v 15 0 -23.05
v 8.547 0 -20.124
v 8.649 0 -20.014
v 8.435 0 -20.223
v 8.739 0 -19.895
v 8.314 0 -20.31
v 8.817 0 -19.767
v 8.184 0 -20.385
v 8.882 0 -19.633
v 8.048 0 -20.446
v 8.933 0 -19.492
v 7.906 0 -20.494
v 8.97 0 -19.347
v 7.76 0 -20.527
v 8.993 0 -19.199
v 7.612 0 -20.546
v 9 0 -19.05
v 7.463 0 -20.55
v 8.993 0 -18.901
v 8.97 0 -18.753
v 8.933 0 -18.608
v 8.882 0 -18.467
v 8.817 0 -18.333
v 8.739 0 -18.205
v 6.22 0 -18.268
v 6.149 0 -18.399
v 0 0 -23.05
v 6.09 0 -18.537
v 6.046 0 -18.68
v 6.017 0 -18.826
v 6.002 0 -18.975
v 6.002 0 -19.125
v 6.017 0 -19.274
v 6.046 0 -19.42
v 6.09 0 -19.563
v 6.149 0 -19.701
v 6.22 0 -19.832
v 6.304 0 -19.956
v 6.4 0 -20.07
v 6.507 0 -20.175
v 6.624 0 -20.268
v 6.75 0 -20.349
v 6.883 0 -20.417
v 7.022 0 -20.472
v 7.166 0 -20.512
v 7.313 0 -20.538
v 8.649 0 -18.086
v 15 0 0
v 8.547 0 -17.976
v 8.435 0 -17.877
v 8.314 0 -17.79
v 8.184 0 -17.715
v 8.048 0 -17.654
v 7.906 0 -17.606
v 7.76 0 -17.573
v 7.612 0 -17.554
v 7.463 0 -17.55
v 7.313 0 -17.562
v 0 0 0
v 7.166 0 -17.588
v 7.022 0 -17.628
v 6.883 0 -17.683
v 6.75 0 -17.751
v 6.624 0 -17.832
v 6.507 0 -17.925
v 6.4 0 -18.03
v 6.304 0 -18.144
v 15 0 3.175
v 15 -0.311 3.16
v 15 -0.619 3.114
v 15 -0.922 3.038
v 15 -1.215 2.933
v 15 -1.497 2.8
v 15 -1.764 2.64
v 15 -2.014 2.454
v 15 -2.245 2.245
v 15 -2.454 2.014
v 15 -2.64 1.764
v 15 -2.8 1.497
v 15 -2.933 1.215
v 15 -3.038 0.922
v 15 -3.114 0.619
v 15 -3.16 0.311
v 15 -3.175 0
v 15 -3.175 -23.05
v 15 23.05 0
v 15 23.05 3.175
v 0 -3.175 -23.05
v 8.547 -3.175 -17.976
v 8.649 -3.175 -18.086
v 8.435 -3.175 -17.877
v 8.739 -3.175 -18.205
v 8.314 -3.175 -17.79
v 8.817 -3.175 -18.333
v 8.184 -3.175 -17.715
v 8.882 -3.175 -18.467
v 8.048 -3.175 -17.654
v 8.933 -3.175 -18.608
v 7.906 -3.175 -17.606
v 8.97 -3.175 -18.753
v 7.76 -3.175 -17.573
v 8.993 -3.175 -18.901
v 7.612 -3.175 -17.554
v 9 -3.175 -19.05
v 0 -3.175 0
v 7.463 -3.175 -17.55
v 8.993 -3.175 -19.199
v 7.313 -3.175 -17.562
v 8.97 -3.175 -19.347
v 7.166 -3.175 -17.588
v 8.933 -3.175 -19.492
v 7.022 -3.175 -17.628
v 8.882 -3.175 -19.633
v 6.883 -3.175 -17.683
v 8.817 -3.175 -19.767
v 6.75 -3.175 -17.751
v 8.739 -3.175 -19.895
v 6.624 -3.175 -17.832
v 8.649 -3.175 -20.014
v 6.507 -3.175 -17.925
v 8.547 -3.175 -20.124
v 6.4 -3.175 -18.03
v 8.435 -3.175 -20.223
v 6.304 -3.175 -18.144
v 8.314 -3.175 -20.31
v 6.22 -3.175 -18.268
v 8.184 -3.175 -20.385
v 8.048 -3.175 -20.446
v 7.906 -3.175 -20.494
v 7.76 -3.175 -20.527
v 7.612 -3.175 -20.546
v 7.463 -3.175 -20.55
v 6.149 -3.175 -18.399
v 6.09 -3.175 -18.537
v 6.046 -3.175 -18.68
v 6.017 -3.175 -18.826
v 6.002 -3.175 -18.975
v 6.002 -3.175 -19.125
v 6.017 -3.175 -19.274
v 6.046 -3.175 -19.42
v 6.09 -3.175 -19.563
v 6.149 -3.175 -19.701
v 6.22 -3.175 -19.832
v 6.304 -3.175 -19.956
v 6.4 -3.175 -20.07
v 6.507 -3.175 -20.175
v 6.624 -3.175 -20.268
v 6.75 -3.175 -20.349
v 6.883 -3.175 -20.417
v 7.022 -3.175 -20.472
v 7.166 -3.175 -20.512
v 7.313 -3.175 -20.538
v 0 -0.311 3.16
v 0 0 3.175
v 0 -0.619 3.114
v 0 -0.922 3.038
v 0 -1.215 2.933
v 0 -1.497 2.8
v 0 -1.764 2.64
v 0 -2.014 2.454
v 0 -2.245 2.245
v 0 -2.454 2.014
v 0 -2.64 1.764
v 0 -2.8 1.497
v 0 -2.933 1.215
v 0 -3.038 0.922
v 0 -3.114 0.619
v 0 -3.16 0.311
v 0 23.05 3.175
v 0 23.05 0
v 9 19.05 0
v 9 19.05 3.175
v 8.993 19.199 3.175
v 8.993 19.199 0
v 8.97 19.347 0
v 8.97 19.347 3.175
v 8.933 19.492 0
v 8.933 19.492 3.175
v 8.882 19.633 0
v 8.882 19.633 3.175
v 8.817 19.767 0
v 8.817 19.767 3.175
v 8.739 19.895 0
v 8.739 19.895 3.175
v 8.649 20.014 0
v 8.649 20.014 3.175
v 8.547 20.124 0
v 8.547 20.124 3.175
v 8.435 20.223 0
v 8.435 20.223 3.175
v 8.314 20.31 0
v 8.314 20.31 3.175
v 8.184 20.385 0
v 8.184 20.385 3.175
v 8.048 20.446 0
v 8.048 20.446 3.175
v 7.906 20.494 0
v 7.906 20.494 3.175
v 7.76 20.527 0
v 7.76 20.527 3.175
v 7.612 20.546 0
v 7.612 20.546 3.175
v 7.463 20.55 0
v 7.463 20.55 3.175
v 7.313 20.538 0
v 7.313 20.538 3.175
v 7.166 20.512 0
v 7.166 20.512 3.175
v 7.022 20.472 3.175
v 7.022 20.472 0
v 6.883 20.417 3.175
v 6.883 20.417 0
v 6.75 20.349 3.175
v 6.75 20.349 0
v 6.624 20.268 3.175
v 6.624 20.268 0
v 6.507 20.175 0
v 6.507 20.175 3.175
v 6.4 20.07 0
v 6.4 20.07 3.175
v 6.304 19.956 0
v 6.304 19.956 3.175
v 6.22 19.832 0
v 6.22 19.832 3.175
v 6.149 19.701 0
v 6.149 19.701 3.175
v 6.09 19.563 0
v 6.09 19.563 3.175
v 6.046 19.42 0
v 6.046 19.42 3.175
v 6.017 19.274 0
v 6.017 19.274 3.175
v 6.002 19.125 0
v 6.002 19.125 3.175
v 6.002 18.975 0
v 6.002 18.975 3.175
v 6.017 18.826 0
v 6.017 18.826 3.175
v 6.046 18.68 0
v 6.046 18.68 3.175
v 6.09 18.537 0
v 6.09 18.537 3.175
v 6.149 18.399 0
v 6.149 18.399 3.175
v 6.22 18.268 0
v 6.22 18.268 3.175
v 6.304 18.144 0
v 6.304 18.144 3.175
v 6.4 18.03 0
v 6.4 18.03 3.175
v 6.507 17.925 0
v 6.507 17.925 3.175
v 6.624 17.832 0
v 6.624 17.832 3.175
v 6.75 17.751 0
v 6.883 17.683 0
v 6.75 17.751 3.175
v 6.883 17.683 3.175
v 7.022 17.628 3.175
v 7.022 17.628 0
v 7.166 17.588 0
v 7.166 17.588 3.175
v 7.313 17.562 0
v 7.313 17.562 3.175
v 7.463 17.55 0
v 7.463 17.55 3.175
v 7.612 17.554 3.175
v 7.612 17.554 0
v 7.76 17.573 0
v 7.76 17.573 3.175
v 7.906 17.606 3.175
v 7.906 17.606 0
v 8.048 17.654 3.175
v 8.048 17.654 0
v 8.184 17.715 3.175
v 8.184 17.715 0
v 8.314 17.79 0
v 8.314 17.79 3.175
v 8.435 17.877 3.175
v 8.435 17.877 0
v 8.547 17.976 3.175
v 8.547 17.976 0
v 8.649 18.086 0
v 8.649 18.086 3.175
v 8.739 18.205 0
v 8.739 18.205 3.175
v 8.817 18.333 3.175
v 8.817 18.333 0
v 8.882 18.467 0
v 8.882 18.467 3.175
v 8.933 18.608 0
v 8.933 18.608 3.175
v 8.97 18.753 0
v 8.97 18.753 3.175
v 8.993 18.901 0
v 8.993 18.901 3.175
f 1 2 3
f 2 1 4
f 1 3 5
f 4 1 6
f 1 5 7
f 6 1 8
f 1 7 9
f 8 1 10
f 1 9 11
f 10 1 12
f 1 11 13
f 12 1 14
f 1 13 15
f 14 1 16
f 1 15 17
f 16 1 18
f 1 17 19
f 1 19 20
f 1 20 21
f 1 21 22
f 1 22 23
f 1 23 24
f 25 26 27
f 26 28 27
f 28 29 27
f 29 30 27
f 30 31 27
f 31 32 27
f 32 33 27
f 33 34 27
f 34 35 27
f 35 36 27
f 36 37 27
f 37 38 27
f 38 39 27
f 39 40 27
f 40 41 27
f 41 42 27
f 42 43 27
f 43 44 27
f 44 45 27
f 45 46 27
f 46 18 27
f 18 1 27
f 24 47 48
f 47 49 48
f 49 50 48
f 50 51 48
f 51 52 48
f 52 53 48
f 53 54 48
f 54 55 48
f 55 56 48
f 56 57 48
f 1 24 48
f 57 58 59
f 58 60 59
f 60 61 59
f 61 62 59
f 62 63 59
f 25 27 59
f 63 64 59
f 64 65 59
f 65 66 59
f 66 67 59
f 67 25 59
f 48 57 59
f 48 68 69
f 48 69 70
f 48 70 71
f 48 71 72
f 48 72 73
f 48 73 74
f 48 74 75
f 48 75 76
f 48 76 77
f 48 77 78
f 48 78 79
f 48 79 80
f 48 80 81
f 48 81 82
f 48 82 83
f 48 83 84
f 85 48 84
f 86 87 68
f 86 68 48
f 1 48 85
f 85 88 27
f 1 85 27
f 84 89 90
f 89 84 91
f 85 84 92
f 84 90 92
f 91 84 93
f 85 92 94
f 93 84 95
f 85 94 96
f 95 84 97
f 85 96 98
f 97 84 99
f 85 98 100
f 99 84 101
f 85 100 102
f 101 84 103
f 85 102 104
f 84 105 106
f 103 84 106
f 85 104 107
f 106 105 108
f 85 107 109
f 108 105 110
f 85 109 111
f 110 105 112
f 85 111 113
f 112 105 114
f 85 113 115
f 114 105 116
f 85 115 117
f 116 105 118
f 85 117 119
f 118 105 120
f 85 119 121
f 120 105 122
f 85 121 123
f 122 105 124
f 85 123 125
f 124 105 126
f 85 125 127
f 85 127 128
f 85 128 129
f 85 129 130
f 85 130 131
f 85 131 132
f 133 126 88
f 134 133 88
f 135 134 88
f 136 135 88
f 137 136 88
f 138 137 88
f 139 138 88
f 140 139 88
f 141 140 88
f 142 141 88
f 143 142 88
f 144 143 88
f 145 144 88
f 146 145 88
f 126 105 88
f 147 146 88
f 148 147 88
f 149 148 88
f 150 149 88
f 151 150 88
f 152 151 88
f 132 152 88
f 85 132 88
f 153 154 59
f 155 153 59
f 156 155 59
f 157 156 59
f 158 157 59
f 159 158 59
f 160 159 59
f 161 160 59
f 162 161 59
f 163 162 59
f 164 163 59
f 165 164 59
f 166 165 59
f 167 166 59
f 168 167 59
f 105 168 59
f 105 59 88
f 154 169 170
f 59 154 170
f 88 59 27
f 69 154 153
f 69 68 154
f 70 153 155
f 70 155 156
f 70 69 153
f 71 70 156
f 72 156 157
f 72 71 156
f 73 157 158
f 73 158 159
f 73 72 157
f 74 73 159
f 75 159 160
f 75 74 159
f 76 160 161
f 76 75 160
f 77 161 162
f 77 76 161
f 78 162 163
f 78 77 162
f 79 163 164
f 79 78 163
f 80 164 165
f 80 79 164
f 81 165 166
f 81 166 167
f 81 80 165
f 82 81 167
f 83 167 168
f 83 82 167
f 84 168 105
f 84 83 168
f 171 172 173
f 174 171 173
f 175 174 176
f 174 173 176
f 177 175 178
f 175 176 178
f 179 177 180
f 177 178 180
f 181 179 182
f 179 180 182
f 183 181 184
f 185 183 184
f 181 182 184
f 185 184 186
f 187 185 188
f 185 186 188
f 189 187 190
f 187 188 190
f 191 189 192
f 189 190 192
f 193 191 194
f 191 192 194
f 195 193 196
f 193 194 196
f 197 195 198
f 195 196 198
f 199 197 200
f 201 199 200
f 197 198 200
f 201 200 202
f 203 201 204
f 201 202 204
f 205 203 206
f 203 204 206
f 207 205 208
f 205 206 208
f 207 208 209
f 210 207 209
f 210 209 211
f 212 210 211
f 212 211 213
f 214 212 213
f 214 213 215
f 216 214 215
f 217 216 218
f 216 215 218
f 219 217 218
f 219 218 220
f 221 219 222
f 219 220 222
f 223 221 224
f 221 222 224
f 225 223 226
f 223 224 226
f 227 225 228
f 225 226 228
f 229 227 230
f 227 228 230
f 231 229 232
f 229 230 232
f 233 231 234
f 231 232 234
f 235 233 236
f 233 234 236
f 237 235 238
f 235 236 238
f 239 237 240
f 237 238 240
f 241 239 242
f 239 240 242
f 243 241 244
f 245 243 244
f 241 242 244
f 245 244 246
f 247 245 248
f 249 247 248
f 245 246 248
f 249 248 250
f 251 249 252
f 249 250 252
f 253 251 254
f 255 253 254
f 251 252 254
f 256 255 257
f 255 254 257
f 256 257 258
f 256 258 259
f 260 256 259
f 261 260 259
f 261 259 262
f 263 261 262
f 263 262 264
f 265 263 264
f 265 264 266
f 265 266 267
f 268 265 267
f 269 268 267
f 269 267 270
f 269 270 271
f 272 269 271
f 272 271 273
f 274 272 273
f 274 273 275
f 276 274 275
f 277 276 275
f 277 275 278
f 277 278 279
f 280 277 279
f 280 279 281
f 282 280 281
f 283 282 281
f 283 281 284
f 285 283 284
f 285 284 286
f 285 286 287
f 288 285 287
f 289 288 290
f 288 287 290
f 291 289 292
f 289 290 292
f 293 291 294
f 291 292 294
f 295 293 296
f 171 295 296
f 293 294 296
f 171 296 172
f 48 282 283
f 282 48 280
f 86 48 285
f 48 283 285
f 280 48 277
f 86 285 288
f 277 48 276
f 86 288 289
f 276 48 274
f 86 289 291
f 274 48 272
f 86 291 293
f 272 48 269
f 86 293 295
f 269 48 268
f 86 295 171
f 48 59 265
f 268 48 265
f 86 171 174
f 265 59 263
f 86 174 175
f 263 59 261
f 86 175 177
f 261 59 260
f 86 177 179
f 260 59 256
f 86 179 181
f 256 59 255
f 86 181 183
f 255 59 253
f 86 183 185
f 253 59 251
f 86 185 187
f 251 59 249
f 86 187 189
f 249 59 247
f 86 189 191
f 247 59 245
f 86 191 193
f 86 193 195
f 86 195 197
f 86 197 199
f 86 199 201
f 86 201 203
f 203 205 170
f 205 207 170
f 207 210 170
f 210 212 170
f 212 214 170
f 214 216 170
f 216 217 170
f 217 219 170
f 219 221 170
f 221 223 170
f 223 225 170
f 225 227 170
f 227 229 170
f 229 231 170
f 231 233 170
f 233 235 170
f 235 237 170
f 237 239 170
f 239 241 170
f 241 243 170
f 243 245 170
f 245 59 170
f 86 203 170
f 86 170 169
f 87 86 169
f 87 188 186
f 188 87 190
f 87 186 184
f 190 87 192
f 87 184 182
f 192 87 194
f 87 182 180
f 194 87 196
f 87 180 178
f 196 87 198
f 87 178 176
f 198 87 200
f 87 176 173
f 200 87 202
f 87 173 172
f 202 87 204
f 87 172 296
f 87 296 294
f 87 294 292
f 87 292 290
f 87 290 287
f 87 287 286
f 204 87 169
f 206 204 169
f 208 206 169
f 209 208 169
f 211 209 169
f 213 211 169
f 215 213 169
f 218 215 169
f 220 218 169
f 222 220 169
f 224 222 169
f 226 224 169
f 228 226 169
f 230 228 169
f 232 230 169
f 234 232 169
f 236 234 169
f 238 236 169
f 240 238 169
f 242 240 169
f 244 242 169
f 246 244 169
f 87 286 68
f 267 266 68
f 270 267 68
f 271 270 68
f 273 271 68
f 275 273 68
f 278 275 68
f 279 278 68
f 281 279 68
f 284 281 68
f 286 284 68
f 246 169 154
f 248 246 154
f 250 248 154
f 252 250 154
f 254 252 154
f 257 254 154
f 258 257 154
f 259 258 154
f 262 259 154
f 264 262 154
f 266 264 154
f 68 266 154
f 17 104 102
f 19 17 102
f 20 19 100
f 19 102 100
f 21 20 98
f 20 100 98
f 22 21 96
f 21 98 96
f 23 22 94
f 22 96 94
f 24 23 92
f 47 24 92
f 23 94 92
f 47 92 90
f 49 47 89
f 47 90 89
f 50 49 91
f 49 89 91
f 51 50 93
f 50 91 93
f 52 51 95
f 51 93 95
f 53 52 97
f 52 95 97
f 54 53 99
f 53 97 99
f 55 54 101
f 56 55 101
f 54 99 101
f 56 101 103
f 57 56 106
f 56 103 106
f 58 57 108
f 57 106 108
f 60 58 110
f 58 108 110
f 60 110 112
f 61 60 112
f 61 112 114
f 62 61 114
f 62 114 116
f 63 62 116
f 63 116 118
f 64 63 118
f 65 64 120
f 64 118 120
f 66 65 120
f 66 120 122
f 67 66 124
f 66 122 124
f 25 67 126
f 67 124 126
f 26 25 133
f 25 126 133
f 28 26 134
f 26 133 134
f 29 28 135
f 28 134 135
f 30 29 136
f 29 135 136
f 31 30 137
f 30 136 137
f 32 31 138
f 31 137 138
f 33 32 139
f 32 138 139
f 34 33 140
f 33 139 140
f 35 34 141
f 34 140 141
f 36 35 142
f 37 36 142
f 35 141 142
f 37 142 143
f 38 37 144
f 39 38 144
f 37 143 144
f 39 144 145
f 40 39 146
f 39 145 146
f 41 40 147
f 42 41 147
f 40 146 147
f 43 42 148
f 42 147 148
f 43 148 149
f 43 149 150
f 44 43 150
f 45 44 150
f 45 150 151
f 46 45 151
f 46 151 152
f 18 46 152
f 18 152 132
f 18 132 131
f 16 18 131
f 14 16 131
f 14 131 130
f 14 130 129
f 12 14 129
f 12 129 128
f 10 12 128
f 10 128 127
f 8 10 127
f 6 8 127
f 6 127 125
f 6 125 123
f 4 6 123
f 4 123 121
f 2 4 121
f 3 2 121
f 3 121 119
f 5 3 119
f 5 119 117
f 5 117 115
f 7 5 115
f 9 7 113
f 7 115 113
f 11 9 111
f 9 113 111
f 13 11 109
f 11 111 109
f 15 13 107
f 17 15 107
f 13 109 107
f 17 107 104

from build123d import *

# Parameters (mm, degrees)
BOSS_EXTRUDE1_DEPTH = 15
FILLET2_R           = 3.175
SKETCH7_R           = 1.5
CUT_EXTRUDE4_DEPTH  = 3.175
SKETCH8_R           = 1.5
CUT_EXTRUDE5_DEPTH  = 3.175


with BuildPart() as part:
    # Sketch1 → Boss-Extrude1 (new body)
    with BuildSketch(Plane(origin=(0, 0, 0), x_dir=(0, 0, -1), z_dir=(1, 0, 0))):
        Polygon((-3.175, 23.05), (-3.175, -3.175), (23.05, -3.175), (23.05, 0), (0, 0), (0, 23.05), align=None)
    extrude(amount=BOSS_EXTRUDE1_DEPTH)

    # Fillet2
    fillet2_edges = [part.edges().sort_by_distance(p)[0] for p in [
        (7.5, -3.175, 3.175),
    ]]
    fillet(fillet2_edges, radius=FILLET2_R)

    # Sketch7 → Cut-Extrude4 (cut)
    with BuildSketch(Plane.XY.offset(3.175)):
        with Locations((7.5, 19.05)):
            Circle(SKETCH7_R)
    extrude(amount=-CUT_EXTRUDE4_DEPTH, mode=Mode.SUBTRACT)

    # Sketch8 → Cut-Extrude5 (cut)
    with BuildSketch(Plane.XZ.offset(3.175)):
        with Locations((7.5, -19.05)):
            Circle(SKETCH8_R)
    extrude(amount=-CUT_EXTRUDE5_DEPTH, mode=Mode.SUBTRACT)


solid = part.part
